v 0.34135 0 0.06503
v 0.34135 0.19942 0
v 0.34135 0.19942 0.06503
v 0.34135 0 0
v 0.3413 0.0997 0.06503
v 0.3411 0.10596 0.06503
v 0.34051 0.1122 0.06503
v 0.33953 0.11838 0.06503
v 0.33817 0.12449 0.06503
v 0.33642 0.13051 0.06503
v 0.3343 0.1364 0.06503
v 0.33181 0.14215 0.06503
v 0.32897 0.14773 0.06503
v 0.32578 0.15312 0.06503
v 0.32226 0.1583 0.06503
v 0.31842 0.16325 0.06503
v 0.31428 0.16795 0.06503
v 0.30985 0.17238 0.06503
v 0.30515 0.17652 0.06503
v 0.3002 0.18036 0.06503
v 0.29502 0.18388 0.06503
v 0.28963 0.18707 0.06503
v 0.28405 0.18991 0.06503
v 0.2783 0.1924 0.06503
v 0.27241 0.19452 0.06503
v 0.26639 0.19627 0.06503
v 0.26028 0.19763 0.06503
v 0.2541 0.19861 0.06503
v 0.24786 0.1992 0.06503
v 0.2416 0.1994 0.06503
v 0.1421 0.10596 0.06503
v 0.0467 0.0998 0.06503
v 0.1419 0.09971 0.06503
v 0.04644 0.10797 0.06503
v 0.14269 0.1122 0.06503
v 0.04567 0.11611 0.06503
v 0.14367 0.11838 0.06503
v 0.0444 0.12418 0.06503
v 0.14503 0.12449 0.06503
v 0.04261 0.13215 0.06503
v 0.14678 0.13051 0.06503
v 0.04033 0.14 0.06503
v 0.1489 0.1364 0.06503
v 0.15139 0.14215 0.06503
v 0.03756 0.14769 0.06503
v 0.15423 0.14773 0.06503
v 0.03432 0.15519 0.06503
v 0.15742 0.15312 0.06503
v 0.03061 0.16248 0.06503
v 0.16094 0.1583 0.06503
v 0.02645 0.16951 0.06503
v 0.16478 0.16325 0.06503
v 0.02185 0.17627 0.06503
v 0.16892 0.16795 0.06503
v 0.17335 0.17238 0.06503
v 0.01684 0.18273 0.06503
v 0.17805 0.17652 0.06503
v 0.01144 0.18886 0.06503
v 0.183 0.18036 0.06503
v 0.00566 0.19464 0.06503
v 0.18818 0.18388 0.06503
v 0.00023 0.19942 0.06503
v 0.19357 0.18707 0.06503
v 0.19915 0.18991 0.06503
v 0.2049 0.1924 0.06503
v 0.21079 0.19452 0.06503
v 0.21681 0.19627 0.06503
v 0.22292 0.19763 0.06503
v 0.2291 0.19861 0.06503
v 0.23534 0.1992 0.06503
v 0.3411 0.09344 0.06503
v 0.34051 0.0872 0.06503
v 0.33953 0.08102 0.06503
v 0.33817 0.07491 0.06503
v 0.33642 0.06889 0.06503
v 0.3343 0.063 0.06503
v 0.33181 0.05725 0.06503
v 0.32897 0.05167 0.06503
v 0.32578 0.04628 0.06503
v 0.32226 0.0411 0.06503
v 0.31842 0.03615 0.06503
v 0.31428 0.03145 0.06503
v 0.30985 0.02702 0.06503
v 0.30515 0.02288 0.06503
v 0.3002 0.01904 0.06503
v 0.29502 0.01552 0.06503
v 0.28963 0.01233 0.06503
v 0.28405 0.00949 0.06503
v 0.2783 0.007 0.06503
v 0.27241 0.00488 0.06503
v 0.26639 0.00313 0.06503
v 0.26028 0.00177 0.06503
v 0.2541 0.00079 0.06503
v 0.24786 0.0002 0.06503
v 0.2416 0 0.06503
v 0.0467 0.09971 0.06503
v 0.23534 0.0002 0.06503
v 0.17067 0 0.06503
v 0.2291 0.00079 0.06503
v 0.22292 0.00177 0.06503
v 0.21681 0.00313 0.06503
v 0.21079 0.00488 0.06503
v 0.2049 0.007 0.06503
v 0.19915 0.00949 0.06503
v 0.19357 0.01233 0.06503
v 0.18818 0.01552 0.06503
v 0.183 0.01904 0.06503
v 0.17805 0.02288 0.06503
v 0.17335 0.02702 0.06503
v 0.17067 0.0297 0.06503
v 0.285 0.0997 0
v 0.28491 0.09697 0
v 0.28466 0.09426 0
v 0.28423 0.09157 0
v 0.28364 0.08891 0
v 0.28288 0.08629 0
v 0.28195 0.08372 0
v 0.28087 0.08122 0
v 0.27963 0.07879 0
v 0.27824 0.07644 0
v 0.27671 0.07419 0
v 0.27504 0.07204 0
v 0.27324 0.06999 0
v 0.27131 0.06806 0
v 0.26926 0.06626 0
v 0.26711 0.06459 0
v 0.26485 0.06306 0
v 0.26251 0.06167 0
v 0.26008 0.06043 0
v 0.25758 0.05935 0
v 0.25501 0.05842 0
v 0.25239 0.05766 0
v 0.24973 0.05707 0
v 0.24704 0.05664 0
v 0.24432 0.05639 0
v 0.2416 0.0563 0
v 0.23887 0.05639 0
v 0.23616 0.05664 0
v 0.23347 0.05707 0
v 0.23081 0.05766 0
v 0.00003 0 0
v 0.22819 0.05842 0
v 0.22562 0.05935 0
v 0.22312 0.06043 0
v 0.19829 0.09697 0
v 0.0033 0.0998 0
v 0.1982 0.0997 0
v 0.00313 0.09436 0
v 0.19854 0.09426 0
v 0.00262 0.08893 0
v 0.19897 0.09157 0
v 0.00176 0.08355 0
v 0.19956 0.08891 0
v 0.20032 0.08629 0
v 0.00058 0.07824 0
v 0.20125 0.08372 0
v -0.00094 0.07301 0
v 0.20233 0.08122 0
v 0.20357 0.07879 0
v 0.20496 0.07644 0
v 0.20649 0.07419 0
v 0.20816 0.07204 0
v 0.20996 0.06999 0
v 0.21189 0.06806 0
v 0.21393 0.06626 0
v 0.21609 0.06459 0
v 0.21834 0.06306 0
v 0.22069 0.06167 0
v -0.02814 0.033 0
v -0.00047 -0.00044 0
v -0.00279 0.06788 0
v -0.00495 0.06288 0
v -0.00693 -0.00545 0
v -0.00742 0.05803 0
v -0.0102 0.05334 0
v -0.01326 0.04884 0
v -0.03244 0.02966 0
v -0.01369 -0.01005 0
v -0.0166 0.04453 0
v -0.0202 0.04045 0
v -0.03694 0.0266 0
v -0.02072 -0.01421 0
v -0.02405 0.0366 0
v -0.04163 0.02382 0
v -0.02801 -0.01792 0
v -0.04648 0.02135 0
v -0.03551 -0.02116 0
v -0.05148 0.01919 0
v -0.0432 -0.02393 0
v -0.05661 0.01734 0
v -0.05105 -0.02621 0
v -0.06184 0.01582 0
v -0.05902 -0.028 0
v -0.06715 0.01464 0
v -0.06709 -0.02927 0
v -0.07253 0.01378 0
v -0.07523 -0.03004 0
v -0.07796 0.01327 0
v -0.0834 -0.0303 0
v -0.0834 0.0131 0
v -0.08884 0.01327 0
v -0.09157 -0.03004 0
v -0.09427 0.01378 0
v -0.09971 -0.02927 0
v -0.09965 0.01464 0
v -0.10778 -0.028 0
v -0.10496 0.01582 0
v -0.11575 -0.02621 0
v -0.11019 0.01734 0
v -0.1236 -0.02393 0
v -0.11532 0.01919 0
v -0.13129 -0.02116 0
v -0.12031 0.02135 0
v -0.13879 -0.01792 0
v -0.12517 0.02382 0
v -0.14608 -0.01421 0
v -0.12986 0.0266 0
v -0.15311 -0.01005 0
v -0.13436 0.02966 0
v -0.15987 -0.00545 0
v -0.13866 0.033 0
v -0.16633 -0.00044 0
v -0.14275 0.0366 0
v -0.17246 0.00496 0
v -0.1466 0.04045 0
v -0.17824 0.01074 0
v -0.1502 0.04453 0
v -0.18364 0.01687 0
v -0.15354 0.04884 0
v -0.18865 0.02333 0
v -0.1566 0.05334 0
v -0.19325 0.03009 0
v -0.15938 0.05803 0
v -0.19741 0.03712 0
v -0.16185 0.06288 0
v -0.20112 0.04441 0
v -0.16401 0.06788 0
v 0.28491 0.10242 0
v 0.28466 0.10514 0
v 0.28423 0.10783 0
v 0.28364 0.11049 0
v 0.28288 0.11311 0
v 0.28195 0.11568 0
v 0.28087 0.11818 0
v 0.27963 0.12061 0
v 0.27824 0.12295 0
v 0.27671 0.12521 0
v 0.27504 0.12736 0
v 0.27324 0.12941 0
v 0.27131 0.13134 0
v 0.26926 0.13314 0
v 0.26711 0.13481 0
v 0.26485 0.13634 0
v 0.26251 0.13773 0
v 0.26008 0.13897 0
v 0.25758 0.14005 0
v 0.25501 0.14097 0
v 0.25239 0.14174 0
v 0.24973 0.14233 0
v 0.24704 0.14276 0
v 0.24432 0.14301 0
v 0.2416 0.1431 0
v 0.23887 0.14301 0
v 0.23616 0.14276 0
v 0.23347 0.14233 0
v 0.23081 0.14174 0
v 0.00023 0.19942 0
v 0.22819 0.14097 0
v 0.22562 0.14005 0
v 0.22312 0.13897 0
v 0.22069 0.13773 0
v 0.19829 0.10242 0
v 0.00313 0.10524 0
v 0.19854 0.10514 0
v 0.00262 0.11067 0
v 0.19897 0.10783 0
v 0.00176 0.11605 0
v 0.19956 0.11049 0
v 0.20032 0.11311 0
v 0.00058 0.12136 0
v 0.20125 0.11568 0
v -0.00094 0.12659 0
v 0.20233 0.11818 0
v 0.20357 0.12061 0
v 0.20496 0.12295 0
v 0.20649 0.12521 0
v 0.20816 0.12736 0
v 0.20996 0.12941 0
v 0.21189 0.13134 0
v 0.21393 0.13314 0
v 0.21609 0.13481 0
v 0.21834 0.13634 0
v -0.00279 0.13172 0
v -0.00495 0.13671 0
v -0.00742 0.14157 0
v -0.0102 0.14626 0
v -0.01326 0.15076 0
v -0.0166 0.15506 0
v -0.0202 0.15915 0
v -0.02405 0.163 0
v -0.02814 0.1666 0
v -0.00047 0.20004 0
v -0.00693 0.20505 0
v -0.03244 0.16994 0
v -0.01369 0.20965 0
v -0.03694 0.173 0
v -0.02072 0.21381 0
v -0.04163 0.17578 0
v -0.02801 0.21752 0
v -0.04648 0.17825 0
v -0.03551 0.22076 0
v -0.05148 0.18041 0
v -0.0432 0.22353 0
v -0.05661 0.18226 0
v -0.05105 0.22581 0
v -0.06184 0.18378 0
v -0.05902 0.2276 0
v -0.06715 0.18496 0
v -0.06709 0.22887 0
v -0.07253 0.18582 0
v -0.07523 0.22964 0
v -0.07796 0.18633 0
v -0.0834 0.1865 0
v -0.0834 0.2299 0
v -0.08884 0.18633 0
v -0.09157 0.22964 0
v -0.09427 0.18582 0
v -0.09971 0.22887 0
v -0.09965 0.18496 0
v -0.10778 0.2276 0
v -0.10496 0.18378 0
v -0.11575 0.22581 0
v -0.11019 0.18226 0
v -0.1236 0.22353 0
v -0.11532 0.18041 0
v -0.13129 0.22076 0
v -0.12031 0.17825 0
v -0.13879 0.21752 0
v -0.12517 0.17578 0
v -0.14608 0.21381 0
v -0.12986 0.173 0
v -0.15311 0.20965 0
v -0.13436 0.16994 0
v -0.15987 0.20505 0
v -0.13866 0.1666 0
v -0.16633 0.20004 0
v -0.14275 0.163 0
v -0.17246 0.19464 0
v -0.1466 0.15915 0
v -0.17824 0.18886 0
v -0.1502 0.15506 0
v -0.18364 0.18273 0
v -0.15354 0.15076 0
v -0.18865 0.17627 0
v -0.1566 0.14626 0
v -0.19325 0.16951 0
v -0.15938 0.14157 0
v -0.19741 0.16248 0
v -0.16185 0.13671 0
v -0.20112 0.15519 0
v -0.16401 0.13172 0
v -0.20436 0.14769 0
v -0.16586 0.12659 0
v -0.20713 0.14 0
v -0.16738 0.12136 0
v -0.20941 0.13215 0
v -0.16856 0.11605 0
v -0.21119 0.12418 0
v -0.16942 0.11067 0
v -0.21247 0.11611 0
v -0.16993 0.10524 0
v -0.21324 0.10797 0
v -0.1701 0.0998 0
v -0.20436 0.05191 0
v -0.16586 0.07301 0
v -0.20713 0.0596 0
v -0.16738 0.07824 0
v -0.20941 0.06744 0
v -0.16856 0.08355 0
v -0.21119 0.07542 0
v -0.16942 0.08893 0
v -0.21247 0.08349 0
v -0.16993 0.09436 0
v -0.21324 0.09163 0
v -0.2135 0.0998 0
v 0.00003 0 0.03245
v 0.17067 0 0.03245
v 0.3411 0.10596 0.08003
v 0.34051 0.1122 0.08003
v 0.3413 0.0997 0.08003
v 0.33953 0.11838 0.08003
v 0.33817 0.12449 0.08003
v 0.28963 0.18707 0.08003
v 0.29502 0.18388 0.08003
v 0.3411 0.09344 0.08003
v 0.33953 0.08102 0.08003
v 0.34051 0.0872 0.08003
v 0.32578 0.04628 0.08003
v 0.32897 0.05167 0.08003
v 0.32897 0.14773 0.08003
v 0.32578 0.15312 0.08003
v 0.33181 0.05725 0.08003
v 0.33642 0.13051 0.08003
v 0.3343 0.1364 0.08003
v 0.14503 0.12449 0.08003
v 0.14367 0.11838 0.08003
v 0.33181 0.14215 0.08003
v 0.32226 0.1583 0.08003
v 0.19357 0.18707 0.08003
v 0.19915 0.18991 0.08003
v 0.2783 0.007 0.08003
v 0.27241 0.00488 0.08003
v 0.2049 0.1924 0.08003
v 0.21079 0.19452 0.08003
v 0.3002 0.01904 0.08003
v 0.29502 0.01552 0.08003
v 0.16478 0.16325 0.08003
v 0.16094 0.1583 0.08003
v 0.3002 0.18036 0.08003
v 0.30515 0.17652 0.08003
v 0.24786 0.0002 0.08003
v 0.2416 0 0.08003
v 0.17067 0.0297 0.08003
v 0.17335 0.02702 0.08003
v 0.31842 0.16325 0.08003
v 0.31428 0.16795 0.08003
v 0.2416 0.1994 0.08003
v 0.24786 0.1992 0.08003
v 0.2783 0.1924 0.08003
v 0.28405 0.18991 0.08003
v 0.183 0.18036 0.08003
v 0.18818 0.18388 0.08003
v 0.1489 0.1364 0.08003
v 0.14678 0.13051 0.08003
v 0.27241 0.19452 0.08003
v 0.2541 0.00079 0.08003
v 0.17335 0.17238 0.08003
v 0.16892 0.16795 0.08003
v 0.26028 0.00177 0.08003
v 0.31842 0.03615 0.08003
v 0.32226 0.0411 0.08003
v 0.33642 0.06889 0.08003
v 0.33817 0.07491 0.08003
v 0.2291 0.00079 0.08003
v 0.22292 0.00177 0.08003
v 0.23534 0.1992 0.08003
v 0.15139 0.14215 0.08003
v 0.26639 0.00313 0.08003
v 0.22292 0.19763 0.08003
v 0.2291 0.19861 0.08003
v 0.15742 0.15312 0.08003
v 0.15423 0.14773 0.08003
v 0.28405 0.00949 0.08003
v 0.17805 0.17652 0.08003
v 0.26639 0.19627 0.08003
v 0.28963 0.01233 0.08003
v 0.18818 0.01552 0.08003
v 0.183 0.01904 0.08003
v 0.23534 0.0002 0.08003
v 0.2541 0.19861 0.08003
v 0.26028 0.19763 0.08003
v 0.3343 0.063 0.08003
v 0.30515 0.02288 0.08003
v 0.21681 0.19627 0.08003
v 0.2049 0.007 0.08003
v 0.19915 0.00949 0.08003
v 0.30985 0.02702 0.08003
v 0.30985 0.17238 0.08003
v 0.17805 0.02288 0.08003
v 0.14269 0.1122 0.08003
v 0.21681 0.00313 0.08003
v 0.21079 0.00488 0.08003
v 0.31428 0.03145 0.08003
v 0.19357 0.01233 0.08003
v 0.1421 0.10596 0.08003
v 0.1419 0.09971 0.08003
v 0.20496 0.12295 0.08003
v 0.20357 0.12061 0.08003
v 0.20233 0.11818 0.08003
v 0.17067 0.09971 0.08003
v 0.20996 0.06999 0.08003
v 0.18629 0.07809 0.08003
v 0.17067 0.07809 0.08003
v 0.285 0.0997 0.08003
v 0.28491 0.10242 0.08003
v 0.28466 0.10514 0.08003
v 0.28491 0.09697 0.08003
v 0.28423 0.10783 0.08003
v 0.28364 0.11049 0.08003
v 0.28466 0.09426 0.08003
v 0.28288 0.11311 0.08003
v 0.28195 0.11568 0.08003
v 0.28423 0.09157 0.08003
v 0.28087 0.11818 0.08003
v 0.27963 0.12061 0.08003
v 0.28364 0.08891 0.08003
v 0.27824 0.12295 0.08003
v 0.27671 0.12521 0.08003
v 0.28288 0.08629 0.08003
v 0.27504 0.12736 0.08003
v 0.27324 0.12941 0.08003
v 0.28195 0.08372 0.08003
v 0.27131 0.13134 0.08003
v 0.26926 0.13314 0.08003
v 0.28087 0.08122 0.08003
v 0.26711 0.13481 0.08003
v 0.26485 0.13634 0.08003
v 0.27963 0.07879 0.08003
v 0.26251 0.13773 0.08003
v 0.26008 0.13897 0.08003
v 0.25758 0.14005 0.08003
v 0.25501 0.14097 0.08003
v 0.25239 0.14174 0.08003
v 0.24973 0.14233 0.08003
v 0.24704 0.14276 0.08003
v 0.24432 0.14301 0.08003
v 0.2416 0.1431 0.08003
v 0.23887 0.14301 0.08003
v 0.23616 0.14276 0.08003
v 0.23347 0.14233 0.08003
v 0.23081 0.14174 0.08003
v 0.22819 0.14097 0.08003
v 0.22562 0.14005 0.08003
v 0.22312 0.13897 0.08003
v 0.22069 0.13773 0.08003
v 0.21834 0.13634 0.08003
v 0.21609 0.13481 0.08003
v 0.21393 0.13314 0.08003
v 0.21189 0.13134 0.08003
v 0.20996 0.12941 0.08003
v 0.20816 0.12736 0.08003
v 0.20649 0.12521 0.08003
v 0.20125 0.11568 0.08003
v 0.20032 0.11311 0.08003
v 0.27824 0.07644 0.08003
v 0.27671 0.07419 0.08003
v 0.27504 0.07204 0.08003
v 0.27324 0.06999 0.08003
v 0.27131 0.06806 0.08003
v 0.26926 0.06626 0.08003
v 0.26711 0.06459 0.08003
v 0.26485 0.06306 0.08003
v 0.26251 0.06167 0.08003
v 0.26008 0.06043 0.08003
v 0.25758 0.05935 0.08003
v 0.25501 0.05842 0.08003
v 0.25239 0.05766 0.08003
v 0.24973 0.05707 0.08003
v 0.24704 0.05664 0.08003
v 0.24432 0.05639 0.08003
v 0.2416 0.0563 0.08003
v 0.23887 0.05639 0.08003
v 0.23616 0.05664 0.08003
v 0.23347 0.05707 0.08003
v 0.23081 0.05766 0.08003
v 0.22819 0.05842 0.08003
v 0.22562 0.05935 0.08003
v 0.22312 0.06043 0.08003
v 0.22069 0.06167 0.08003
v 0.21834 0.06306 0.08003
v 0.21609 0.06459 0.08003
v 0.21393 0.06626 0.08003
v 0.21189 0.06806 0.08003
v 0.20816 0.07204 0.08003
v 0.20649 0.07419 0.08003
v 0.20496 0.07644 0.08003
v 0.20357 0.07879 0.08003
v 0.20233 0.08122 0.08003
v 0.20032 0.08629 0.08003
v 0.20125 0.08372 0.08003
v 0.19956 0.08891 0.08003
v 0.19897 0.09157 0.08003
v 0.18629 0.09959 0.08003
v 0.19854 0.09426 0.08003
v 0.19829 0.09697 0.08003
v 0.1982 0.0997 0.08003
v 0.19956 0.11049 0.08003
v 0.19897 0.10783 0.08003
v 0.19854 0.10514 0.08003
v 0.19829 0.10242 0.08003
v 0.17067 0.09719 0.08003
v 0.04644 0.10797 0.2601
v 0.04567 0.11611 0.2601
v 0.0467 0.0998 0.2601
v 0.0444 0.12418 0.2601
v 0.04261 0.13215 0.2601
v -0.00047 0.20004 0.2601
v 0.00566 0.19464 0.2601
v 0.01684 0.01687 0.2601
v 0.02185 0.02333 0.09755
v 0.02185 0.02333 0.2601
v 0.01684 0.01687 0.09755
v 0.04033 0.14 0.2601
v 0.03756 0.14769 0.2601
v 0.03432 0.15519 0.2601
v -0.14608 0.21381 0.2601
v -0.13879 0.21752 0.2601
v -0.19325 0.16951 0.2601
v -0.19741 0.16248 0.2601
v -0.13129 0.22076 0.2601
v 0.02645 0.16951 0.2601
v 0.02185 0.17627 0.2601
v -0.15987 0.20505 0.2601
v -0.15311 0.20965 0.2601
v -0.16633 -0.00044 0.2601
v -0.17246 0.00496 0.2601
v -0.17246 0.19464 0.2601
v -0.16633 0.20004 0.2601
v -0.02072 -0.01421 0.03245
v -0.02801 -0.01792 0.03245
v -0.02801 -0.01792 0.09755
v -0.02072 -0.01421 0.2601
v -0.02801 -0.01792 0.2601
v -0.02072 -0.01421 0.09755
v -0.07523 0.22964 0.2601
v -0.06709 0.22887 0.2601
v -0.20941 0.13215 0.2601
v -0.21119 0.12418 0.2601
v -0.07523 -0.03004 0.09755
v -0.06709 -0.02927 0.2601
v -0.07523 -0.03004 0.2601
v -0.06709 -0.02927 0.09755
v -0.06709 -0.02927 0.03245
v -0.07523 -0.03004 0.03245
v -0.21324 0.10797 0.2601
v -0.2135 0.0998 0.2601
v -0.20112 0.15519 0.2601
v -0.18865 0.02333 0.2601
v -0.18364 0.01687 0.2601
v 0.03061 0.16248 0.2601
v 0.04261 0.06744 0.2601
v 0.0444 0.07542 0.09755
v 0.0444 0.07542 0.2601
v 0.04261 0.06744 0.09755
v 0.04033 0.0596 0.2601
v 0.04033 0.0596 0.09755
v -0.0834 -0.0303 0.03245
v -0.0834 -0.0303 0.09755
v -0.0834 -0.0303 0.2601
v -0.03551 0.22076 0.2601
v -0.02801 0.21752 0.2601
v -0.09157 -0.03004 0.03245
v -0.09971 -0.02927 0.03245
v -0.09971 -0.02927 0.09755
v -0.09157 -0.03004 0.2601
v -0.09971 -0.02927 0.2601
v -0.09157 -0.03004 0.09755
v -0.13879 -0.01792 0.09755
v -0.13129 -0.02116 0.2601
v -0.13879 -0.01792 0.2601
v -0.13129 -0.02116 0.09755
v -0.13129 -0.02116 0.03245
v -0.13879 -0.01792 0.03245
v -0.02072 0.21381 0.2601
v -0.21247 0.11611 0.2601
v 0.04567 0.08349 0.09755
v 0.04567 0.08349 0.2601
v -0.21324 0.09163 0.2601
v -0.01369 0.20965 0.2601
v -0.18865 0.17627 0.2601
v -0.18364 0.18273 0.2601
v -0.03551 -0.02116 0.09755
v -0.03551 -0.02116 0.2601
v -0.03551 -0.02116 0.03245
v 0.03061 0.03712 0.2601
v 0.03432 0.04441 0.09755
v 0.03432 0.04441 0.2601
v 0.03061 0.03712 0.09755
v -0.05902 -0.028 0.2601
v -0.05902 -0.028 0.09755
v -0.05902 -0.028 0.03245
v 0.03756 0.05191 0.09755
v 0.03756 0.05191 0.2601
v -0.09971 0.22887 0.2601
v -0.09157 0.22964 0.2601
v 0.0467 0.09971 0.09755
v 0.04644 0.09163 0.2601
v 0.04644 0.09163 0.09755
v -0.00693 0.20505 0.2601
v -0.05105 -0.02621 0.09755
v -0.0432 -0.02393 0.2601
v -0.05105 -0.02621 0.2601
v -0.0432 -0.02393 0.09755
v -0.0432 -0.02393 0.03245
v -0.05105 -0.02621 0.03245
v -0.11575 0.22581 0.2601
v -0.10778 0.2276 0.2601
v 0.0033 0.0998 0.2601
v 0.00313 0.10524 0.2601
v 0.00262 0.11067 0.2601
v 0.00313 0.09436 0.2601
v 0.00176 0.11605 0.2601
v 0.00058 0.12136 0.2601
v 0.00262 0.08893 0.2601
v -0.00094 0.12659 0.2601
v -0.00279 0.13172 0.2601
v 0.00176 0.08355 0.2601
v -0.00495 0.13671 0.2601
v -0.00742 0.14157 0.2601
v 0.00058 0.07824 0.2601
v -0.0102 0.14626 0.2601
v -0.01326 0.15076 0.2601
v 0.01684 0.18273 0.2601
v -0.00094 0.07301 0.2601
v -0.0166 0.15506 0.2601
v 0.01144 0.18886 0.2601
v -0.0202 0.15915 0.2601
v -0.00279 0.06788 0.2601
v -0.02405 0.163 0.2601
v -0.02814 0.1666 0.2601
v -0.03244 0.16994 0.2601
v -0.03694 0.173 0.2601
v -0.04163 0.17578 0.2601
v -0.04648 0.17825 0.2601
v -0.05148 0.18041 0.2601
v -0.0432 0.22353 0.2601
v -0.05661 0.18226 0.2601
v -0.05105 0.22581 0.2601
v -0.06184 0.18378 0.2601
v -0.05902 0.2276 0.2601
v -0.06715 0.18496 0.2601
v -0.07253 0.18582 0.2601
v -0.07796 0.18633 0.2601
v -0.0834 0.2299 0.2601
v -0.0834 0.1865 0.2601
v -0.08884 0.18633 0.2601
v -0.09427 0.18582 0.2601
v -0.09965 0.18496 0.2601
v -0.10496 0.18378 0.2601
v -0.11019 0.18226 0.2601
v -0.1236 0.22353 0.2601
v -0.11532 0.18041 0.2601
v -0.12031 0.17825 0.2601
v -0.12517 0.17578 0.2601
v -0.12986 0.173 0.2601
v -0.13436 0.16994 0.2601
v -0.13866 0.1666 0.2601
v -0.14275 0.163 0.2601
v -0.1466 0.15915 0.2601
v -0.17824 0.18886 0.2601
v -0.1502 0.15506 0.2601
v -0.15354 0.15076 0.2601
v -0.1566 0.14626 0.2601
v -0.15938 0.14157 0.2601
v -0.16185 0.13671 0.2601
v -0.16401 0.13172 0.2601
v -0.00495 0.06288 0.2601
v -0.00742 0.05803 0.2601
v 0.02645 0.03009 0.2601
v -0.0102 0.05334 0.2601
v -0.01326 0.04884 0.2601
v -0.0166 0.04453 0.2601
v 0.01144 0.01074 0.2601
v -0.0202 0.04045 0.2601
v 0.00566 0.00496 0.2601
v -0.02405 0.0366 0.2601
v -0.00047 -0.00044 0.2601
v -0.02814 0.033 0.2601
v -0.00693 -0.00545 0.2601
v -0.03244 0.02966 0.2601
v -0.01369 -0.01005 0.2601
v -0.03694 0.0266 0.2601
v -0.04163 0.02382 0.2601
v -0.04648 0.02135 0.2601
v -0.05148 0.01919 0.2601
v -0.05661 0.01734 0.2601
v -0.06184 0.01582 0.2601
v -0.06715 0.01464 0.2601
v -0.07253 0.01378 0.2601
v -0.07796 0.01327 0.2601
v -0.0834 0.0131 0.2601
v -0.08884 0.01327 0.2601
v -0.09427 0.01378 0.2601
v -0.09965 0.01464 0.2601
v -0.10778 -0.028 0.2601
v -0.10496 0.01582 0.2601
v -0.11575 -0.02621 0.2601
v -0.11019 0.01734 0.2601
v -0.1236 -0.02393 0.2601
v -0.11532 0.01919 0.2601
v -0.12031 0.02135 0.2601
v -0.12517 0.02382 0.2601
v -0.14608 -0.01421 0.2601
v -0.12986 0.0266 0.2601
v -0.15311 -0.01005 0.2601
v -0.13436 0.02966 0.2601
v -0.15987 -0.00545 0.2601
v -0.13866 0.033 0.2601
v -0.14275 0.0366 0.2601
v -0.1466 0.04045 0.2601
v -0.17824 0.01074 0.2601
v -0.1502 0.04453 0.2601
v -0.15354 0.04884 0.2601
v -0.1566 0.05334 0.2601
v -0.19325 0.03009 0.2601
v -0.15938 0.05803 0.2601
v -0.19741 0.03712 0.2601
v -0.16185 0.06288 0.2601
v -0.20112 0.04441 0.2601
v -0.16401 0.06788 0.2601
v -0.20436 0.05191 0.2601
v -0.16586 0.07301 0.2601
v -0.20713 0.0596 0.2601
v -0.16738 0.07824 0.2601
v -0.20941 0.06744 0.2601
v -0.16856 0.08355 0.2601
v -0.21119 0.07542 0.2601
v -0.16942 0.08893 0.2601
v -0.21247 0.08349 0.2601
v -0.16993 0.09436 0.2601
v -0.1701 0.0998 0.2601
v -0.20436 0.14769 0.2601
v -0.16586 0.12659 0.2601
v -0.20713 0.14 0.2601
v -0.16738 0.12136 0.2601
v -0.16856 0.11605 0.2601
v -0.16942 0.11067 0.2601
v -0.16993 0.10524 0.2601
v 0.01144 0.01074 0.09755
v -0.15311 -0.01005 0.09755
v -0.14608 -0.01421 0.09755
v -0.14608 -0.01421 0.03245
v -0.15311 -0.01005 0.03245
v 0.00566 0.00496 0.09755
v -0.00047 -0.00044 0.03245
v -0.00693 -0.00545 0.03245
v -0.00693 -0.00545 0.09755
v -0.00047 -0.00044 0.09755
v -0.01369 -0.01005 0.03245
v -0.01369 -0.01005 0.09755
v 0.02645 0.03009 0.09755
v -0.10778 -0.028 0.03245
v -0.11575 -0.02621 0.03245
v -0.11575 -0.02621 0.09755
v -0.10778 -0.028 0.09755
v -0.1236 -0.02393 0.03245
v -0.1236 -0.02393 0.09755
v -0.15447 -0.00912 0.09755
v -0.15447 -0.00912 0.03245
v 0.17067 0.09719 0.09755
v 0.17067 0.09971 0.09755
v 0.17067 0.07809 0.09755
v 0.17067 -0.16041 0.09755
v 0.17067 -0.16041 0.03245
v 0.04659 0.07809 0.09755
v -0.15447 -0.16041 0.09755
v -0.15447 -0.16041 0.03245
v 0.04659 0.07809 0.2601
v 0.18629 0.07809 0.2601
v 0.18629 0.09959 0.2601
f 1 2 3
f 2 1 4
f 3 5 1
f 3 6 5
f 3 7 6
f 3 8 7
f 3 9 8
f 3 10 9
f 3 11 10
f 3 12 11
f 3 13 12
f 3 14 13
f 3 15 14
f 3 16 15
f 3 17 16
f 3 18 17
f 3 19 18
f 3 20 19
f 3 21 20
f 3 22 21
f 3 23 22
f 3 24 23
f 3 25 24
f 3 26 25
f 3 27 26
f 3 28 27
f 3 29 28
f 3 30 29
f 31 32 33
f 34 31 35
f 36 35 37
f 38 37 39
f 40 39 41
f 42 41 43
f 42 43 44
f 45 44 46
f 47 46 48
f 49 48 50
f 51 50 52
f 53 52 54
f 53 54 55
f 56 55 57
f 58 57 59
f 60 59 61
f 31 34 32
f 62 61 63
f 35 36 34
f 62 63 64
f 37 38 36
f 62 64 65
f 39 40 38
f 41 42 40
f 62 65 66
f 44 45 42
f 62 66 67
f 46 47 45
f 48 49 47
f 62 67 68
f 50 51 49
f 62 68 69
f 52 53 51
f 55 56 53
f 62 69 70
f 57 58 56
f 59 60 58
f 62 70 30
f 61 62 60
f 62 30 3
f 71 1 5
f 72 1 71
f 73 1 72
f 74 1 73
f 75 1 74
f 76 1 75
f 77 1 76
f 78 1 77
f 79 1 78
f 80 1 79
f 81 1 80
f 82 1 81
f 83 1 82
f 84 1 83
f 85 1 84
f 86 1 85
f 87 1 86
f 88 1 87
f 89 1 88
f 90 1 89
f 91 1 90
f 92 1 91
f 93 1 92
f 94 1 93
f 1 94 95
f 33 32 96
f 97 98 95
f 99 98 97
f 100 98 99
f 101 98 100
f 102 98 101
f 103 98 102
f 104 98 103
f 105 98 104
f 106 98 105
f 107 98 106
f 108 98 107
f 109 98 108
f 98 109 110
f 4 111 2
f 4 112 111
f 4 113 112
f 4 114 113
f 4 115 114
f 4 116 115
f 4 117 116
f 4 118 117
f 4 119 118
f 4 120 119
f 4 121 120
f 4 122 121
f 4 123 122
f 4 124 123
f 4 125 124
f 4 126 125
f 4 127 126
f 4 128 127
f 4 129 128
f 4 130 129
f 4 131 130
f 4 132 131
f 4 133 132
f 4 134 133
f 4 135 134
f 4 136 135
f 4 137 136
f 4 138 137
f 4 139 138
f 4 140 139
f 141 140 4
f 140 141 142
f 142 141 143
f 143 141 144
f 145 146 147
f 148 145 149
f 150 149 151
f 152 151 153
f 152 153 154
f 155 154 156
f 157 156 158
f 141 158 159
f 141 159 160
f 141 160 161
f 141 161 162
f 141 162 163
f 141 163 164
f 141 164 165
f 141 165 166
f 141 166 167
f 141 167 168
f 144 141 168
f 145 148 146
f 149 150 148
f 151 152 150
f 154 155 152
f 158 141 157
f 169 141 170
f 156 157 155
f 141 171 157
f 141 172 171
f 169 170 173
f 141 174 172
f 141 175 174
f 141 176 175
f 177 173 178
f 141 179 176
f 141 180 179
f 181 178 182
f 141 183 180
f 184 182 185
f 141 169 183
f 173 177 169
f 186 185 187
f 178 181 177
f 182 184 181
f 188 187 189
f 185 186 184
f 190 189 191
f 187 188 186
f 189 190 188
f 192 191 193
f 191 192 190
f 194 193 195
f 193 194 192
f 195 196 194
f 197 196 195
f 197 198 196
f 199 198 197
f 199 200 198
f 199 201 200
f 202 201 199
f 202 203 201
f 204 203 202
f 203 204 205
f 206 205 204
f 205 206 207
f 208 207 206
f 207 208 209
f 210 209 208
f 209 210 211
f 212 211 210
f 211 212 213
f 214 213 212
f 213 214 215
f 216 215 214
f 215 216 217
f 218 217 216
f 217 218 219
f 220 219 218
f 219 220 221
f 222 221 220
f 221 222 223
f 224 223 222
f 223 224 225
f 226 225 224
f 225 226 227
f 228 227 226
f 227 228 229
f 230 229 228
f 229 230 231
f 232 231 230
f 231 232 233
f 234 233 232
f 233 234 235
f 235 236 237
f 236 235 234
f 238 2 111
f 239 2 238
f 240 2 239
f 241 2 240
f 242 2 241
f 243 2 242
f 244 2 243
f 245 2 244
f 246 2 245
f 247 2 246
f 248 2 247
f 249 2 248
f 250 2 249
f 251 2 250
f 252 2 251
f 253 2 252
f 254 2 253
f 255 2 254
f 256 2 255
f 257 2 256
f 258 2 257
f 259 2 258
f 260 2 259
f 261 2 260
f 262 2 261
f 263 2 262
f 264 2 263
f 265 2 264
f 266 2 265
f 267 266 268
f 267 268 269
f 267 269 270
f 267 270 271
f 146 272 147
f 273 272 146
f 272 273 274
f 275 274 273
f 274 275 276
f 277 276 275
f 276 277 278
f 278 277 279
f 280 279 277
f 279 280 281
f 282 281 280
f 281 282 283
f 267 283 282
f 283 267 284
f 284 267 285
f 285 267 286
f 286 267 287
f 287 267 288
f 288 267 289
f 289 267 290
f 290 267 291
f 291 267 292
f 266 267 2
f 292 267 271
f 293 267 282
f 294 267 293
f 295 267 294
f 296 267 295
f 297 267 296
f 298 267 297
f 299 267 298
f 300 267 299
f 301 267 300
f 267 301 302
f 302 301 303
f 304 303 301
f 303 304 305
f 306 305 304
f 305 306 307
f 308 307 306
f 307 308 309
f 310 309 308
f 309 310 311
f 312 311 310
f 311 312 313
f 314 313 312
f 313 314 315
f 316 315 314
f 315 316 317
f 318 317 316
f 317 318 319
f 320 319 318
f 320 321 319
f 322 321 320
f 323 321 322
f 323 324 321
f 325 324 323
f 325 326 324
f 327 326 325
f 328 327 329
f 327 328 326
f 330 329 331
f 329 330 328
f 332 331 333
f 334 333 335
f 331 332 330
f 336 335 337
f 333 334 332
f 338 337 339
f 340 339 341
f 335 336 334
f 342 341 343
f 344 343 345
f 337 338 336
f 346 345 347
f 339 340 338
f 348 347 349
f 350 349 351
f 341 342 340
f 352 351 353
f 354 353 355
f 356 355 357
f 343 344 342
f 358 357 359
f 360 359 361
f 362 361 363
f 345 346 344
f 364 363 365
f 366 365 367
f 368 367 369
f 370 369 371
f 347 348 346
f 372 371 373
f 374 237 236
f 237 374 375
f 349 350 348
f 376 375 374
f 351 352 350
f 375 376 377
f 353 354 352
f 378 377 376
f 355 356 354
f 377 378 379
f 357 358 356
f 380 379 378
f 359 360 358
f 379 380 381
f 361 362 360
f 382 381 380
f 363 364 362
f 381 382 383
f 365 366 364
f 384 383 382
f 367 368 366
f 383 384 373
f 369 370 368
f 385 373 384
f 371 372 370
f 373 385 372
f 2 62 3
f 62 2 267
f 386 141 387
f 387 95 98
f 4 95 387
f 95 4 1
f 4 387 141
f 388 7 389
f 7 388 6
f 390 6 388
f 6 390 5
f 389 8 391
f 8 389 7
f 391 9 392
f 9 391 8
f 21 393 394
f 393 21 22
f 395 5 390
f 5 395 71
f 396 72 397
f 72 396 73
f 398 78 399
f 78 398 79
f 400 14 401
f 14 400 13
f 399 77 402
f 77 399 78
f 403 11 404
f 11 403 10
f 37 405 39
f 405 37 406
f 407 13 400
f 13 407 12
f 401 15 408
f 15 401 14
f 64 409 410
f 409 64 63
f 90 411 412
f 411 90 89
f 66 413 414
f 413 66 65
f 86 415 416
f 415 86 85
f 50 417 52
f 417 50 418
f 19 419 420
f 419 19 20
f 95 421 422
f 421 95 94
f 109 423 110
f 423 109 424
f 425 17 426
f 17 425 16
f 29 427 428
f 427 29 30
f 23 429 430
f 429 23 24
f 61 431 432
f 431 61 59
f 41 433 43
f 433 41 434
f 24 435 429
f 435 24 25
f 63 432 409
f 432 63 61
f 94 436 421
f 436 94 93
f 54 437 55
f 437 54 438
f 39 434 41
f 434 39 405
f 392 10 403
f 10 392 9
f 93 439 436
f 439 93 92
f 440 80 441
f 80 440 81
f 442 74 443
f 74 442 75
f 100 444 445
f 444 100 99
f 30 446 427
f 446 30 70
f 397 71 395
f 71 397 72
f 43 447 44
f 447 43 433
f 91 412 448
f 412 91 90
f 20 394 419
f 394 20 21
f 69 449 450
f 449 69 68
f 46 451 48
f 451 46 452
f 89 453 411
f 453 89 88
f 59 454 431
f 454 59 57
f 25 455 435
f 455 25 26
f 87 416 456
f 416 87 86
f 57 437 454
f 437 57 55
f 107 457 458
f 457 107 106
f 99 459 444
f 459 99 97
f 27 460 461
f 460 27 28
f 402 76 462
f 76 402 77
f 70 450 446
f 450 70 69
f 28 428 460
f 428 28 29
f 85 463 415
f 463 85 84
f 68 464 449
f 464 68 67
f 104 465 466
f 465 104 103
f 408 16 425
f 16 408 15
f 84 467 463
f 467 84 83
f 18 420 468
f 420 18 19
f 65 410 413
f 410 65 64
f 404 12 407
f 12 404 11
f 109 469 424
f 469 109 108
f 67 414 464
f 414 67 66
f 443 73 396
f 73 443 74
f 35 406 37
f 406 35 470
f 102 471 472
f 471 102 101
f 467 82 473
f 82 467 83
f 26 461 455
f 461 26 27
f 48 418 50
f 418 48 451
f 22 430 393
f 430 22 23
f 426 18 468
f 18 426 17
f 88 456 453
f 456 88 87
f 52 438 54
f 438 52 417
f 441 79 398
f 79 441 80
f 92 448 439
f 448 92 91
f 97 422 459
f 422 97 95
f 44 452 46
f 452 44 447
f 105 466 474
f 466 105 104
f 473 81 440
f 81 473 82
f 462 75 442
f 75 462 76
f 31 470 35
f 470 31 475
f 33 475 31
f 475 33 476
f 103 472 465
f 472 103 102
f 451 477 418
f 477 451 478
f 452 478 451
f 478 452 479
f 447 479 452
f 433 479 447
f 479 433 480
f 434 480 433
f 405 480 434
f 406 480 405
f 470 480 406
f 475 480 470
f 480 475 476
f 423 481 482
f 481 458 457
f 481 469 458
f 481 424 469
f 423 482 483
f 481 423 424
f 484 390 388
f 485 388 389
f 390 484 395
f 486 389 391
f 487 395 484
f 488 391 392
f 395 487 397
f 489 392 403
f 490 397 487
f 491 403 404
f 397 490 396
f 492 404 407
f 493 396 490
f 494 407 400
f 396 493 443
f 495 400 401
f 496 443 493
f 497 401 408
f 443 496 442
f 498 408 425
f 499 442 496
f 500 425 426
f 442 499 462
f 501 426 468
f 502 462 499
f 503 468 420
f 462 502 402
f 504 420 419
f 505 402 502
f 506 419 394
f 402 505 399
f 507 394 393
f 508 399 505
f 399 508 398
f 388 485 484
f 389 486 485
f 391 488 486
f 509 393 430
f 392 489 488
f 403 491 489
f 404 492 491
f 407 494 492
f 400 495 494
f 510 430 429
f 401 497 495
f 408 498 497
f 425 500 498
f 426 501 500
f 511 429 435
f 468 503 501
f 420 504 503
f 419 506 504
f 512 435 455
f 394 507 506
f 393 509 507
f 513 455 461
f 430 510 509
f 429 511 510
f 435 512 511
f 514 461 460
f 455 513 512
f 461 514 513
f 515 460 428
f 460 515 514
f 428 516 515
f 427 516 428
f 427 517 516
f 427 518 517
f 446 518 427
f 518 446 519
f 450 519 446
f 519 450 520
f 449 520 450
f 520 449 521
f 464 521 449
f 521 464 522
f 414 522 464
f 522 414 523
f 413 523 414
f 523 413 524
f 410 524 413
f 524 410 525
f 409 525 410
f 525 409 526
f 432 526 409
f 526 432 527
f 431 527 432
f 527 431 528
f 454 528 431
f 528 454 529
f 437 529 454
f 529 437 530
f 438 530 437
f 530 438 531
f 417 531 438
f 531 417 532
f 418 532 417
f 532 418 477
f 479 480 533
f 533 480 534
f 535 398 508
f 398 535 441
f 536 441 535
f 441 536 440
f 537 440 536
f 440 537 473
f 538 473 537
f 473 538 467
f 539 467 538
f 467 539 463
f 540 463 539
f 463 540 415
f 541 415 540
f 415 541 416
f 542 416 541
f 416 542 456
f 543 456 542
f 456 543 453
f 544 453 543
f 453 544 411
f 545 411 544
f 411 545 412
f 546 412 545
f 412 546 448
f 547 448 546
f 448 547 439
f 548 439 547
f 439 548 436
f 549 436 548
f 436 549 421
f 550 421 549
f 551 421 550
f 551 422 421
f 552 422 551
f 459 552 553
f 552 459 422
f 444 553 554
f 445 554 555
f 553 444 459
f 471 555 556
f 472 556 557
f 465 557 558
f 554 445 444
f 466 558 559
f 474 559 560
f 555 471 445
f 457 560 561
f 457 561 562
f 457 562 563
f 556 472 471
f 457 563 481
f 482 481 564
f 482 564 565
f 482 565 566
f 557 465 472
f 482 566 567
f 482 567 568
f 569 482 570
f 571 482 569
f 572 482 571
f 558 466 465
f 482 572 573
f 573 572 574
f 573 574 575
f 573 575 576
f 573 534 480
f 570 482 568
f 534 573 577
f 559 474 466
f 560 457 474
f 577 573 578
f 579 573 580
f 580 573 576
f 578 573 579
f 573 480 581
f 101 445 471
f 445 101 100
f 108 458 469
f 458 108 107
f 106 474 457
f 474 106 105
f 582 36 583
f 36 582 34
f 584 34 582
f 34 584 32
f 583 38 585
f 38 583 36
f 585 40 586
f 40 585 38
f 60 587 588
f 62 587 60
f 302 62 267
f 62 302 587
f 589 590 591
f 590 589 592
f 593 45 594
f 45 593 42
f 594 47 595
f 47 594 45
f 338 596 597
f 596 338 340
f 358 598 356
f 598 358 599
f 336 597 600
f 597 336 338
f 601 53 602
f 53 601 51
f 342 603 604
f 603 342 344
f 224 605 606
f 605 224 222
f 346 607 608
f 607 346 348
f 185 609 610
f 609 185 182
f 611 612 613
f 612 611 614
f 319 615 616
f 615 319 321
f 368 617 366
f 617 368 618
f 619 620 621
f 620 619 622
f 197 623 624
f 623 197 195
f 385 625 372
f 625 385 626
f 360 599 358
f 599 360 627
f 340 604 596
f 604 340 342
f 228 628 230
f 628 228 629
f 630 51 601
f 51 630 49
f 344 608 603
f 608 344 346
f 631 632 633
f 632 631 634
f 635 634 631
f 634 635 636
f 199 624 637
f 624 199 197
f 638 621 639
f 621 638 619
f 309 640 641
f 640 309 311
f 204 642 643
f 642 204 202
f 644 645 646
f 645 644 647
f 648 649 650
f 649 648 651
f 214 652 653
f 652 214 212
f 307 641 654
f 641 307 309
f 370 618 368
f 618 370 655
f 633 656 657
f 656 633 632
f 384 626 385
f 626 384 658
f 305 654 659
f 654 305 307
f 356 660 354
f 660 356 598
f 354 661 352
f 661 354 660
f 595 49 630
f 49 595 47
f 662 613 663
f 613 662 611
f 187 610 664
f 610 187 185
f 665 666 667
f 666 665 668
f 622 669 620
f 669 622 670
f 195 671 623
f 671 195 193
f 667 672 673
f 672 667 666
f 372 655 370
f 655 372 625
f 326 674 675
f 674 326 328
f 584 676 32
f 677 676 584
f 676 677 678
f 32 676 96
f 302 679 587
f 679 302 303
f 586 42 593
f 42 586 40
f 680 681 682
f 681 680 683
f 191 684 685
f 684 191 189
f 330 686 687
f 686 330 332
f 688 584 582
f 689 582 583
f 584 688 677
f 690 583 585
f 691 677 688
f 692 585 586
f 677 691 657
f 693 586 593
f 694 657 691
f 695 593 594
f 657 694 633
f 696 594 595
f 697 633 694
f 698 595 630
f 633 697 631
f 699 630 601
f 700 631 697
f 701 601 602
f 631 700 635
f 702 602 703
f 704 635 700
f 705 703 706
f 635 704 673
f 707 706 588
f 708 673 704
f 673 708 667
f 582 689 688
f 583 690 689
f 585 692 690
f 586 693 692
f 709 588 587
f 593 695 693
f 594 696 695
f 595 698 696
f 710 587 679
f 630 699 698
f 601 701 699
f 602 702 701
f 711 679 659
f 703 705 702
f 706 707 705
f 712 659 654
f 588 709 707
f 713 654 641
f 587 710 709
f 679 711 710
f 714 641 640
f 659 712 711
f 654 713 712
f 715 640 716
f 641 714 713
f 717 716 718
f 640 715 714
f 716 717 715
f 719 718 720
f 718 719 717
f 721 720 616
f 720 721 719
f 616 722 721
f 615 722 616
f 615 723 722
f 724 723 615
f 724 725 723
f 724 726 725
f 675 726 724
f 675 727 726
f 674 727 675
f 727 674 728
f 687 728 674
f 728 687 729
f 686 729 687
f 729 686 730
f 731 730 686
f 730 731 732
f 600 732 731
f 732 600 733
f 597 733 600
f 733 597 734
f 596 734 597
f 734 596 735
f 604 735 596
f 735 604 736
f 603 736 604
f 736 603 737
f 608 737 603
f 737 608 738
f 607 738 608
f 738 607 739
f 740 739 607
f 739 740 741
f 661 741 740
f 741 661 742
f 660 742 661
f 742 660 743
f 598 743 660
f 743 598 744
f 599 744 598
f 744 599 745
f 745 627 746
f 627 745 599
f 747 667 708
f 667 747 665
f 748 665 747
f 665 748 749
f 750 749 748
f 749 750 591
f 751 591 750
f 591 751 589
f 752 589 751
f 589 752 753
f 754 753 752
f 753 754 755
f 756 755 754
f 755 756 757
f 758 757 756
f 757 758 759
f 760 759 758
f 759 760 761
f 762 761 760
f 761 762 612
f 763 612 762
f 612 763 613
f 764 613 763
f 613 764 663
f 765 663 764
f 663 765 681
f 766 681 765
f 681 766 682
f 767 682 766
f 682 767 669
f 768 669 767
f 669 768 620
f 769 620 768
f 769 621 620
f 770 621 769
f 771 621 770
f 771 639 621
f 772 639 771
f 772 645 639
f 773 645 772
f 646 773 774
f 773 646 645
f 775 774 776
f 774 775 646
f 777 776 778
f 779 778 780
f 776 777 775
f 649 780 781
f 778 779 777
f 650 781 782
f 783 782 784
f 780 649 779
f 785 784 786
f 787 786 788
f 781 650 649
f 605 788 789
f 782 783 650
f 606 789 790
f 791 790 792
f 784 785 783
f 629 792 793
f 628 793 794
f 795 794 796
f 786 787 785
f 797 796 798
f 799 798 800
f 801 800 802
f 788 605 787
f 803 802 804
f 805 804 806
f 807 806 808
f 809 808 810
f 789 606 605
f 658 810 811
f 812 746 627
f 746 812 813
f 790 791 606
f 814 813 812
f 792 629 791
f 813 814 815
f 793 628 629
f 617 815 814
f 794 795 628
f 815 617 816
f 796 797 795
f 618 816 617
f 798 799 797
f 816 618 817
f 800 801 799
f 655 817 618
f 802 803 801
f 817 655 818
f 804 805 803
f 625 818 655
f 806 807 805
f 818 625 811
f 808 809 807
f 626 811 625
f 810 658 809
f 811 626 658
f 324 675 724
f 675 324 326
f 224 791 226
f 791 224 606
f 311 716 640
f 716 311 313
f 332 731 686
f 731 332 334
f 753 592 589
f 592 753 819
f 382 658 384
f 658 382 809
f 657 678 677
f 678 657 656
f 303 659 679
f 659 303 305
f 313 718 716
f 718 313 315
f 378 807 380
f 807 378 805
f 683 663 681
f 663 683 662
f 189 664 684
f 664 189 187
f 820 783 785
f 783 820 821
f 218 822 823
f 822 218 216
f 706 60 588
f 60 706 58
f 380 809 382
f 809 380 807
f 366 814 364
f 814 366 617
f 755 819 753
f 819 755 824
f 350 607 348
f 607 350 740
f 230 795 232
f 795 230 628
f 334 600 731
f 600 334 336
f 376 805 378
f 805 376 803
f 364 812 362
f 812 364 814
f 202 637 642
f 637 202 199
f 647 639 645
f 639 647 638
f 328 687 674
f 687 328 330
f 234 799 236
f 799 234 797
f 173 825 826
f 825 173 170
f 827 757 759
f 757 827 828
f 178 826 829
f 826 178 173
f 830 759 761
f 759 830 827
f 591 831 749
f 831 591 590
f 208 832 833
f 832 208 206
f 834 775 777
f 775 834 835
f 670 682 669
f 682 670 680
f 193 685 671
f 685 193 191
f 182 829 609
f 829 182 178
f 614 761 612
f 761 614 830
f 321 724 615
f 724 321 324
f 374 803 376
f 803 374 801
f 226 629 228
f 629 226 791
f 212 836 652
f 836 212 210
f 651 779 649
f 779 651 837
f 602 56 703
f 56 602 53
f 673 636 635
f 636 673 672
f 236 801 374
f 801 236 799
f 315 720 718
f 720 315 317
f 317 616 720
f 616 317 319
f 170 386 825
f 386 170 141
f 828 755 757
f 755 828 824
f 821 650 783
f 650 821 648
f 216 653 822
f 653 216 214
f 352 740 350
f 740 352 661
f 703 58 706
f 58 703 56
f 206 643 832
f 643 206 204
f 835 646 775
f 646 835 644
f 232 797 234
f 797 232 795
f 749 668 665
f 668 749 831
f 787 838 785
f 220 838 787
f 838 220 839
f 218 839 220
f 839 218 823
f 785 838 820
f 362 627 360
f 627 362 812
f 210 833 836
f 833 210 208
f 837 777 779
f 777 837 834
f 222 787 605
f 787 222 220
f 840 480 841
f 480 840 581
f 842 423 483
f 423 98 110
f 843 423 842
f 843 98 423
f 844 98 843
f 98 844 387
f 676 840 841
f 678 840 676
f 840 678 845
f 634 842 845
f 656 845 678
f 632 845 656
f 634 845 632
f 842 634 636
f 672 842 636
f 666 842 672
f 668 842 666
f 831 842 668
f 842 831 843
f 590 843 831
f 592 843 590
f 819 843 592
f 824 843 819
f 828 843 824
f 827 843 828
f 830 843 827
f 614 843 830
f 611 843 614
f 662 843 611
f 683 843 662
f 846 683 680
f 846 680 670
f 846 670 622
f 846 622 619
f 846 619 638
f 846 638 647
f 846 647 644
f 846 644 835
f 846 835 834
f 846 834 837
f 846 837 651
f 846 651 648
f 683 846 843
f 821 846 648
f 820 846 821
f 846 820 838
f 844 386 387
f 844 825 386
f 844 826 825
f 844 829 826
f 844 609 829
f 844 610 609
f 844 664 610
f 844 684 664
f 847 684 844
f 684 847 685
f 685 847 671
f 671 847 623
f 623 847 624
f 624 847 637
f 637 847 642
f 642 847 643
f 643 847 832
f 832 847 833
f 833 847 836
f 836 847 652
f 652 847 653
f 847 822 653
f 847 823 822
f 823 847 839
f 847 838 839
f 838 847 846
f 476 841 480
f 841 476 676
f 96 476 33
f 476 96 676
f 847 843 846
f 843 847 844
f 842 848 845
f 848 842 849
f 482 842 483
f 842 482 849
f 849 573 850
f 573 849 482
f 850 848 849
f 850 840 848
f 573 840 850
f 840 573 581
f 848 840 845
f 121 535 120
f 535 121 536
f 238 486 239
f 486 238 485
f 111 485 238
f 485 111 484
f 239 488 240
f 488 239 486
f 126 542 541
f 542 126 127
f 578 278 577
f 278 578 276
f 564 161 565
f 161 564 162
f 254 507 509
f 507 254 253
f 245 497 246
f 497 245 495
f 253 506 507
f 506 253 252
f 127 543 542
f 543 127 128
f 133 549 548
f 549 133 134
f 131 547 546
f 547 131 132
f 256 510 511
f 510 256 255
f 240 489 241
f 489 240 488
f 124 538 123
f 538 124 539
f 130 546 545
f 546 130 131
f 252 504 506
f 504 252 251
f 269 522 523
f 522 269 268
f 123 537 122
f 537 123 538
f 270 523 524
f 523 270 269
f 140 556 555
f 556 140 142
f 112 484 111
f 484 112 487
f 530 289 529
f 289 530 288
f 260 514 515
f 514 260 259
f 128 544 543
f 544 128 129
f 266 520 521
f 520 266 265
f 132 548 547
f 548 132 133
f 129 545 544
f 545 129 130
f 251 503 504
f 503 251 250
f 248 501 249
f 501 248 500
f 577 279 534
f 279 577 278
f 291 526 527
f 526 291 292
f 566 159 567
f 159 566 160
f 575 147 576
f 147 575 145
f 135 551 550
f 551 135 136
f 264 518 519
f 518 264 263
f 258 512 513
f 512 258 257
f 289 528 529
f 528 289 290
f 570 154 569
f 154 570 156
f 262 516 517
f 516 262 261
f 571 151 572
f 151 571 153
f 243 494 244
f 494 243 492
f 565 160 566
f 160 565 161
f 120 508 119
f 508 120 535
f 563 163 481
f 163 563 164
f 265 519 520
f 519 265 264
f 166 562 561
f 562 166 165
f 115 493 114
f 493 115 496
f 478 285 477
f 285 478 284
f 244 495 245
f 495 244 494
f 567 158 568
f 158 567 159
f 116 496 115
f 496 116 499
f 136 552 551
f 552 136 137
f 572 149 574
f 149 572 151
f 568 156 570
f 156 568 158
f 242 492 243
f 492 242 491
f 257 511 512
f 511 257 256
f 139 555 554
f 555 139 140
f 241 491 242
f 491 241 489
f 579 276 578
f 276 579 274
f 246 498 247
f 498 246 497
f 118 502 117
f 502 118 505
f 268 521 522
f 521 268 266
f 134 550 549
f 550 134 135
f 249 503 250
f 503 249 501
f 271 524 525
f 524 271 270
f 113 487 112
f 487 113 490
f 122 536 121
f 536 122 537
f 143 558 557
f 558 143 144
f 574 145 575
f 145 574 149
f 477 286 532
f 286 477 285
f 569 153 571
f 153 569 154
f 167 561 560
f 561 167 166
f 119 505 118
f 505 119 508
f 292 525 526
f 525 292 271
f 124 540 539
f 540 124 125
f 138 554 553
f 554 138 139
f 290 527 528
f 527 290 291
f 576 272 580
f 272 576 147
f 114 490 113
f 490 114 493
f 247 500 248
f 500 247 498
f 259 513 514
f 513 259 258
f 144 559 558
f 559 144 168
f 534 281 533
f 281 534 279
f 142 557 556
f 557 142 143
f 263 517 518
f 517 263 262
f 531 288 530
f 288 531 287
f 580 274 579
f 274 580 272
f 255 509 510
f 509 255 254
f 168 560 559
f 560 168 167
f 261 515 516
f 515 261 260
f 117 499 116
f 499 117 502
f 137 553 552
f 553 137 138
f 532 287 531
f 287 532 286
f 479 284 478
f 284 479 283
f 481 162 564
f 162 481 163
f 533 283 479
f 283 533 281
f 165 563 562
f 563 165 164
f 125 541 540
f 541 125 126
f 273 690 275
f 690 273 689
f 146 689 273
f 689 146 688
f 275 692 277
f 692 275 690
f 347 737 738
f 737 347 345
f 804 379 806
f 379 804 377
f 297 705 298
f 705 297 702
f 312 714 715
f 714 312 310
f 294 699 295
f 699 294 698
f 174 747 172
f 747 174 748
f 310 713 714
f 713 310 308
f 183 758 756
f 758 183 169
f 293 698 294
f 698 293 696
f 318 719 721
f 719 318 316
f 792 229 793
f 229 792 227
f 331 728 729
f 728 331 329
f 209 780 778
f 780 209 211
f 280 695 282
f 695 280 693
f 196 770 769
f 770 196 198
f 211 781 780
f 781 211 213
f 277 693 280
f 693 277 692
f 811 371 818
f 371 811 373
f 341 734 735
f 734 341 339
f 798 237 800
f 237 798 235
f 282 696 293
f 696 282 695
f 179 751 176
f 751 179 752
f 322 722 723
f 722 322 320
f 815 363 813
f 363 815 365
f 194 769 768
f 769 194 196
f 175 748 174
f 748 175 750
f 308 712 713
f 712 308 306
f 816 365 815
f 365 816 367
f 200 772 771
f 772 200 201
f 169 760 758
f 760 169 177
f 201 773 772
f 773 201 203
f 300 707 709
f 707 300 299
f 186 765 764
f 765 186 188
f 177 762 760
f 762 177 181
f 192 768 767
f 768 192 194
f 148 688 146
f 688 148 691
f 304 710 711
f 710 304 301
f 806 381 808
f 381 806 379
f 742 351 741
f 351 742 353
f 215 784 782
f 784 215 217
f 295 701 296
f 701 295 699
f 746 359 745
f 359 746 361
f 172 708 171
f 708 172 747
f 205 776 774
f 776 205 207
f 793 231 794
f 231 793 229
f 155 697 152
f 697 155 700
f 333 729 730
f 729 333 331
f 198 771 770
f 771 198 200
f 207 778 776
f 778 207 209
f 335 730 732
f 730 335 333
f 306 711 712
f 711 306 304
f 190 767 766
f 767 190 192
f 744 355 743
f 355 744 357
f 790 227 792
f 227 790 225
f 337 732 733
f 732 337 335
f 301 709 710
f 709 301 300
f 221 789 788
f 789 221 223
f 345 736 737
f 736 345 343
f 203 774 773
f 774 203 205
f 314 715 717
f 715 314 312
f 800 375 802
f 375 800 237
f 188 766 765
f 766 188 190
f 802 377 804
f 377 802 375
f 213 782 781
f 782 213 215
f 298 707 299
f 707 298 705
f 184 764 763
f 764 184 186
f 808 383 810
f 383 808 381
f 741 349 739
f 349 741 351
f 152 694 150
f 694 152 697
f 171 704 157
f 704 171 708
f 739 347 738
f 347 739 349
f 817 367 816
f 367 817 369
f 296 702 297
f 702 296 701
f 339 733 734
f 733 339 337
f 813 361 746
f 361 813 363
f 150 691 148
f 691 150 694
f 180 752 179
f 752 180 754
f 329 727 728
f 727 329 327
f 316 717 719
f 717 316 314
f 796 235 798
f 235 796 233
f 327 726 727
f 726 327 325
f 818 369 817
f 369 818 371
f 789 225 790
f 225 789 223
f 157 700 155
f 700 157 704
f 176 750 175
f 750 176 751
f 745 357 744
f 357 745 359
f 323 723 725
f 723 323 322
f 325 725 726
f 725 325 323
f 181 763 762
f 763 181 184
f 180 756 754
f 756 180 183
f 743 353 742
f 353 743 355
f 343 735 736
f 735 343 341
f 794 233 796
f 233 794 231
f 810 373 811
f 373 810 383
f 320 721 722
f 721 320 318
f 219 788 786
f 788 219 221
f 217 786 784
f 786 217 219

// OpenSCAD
// OpenSCAD Parametric Model
$fn = 100;

// Base dimensions
base_len = 0.341352;
base_wid = 0.199422;
base_hgt = 0.065029;

// Annular section parameters
ann_cx = 0.2416;
ann_cy = 0.0997;
ann_r_out = 0.0997;
ann_r_in = 0.0434;
ann_hgt = 0.015;

// Sleeve parameters
slv_cx = -0.0834;
slv_cy = 0.0998;
slv_r_out = 0.1301;
slv_r_in = 0.0867;
slv_hgt = 0.2601;

// Arm parameters
arm_len = 0.325145;
arm_wid = 0.260116;
arm_hgt = 0.1301;
arm_cx = 0.0081;
arm_cy = -0.03035;
arm_z_start = 0.065;

// Web parameters
web_x1 = 0.0466; web_x2 = 0.1863;
web_y1 = 0.0781; web_y2 = 0.0996;
web_z_start = 0.065;
web_z_end = 0.2601;

// Module: Main base block
module base_block() {
    cube([base_len, base_wid, base_hgt]);
}

// Module: Low annular ring on upper surface
module annulus() {
    translate([ann_cx, ann_cy, base_hgt])
        cylinder(h=ann_hgt, r=ann_r_out);
}

// Module: Tall outer sleeve
module sleeve_outer() {
    translate([slv_cx, slv_cy, 0])
        cylinder(h=slv_hgt, r=slv_r_out);
}

// Module: Projecting stepped arm tier
module arm_tier() {
    translate([arm_cx, arm_cy, arm_z_start])
        cube([arm_len, arm_wid, arm_hgt - arm_z_start], center=true);
}

// Module: Triangular web rib
module web_rib() {
    translate([0, 0, web_z_start])
        linear_extrude(height=web_z_end - web_z_start)
            polygon(points=[[web_x1, web_y1], [web_x2, web_y1], [web_x2, web_y2]]);
}

// Module: Full assembly with subtractive features
module model() {
    difference() {
        union() {
            base_block();
            annulus();
            sleeve_outer();
            arm_tier();
            web_rib();
        }
        // Through-hole for annular section
        translate([ann_cx, ann_cy, -1])
            cylinder(h=base_hgt + ann_hgt + 2, r=ann_r_in);
        // Hollow core for sleeve
        translate([slv_cx, slv_cy, -1])
            cylinder(h=slv_hgt + 2, r=slv_r_in);
    }
}

// Render model
model();
